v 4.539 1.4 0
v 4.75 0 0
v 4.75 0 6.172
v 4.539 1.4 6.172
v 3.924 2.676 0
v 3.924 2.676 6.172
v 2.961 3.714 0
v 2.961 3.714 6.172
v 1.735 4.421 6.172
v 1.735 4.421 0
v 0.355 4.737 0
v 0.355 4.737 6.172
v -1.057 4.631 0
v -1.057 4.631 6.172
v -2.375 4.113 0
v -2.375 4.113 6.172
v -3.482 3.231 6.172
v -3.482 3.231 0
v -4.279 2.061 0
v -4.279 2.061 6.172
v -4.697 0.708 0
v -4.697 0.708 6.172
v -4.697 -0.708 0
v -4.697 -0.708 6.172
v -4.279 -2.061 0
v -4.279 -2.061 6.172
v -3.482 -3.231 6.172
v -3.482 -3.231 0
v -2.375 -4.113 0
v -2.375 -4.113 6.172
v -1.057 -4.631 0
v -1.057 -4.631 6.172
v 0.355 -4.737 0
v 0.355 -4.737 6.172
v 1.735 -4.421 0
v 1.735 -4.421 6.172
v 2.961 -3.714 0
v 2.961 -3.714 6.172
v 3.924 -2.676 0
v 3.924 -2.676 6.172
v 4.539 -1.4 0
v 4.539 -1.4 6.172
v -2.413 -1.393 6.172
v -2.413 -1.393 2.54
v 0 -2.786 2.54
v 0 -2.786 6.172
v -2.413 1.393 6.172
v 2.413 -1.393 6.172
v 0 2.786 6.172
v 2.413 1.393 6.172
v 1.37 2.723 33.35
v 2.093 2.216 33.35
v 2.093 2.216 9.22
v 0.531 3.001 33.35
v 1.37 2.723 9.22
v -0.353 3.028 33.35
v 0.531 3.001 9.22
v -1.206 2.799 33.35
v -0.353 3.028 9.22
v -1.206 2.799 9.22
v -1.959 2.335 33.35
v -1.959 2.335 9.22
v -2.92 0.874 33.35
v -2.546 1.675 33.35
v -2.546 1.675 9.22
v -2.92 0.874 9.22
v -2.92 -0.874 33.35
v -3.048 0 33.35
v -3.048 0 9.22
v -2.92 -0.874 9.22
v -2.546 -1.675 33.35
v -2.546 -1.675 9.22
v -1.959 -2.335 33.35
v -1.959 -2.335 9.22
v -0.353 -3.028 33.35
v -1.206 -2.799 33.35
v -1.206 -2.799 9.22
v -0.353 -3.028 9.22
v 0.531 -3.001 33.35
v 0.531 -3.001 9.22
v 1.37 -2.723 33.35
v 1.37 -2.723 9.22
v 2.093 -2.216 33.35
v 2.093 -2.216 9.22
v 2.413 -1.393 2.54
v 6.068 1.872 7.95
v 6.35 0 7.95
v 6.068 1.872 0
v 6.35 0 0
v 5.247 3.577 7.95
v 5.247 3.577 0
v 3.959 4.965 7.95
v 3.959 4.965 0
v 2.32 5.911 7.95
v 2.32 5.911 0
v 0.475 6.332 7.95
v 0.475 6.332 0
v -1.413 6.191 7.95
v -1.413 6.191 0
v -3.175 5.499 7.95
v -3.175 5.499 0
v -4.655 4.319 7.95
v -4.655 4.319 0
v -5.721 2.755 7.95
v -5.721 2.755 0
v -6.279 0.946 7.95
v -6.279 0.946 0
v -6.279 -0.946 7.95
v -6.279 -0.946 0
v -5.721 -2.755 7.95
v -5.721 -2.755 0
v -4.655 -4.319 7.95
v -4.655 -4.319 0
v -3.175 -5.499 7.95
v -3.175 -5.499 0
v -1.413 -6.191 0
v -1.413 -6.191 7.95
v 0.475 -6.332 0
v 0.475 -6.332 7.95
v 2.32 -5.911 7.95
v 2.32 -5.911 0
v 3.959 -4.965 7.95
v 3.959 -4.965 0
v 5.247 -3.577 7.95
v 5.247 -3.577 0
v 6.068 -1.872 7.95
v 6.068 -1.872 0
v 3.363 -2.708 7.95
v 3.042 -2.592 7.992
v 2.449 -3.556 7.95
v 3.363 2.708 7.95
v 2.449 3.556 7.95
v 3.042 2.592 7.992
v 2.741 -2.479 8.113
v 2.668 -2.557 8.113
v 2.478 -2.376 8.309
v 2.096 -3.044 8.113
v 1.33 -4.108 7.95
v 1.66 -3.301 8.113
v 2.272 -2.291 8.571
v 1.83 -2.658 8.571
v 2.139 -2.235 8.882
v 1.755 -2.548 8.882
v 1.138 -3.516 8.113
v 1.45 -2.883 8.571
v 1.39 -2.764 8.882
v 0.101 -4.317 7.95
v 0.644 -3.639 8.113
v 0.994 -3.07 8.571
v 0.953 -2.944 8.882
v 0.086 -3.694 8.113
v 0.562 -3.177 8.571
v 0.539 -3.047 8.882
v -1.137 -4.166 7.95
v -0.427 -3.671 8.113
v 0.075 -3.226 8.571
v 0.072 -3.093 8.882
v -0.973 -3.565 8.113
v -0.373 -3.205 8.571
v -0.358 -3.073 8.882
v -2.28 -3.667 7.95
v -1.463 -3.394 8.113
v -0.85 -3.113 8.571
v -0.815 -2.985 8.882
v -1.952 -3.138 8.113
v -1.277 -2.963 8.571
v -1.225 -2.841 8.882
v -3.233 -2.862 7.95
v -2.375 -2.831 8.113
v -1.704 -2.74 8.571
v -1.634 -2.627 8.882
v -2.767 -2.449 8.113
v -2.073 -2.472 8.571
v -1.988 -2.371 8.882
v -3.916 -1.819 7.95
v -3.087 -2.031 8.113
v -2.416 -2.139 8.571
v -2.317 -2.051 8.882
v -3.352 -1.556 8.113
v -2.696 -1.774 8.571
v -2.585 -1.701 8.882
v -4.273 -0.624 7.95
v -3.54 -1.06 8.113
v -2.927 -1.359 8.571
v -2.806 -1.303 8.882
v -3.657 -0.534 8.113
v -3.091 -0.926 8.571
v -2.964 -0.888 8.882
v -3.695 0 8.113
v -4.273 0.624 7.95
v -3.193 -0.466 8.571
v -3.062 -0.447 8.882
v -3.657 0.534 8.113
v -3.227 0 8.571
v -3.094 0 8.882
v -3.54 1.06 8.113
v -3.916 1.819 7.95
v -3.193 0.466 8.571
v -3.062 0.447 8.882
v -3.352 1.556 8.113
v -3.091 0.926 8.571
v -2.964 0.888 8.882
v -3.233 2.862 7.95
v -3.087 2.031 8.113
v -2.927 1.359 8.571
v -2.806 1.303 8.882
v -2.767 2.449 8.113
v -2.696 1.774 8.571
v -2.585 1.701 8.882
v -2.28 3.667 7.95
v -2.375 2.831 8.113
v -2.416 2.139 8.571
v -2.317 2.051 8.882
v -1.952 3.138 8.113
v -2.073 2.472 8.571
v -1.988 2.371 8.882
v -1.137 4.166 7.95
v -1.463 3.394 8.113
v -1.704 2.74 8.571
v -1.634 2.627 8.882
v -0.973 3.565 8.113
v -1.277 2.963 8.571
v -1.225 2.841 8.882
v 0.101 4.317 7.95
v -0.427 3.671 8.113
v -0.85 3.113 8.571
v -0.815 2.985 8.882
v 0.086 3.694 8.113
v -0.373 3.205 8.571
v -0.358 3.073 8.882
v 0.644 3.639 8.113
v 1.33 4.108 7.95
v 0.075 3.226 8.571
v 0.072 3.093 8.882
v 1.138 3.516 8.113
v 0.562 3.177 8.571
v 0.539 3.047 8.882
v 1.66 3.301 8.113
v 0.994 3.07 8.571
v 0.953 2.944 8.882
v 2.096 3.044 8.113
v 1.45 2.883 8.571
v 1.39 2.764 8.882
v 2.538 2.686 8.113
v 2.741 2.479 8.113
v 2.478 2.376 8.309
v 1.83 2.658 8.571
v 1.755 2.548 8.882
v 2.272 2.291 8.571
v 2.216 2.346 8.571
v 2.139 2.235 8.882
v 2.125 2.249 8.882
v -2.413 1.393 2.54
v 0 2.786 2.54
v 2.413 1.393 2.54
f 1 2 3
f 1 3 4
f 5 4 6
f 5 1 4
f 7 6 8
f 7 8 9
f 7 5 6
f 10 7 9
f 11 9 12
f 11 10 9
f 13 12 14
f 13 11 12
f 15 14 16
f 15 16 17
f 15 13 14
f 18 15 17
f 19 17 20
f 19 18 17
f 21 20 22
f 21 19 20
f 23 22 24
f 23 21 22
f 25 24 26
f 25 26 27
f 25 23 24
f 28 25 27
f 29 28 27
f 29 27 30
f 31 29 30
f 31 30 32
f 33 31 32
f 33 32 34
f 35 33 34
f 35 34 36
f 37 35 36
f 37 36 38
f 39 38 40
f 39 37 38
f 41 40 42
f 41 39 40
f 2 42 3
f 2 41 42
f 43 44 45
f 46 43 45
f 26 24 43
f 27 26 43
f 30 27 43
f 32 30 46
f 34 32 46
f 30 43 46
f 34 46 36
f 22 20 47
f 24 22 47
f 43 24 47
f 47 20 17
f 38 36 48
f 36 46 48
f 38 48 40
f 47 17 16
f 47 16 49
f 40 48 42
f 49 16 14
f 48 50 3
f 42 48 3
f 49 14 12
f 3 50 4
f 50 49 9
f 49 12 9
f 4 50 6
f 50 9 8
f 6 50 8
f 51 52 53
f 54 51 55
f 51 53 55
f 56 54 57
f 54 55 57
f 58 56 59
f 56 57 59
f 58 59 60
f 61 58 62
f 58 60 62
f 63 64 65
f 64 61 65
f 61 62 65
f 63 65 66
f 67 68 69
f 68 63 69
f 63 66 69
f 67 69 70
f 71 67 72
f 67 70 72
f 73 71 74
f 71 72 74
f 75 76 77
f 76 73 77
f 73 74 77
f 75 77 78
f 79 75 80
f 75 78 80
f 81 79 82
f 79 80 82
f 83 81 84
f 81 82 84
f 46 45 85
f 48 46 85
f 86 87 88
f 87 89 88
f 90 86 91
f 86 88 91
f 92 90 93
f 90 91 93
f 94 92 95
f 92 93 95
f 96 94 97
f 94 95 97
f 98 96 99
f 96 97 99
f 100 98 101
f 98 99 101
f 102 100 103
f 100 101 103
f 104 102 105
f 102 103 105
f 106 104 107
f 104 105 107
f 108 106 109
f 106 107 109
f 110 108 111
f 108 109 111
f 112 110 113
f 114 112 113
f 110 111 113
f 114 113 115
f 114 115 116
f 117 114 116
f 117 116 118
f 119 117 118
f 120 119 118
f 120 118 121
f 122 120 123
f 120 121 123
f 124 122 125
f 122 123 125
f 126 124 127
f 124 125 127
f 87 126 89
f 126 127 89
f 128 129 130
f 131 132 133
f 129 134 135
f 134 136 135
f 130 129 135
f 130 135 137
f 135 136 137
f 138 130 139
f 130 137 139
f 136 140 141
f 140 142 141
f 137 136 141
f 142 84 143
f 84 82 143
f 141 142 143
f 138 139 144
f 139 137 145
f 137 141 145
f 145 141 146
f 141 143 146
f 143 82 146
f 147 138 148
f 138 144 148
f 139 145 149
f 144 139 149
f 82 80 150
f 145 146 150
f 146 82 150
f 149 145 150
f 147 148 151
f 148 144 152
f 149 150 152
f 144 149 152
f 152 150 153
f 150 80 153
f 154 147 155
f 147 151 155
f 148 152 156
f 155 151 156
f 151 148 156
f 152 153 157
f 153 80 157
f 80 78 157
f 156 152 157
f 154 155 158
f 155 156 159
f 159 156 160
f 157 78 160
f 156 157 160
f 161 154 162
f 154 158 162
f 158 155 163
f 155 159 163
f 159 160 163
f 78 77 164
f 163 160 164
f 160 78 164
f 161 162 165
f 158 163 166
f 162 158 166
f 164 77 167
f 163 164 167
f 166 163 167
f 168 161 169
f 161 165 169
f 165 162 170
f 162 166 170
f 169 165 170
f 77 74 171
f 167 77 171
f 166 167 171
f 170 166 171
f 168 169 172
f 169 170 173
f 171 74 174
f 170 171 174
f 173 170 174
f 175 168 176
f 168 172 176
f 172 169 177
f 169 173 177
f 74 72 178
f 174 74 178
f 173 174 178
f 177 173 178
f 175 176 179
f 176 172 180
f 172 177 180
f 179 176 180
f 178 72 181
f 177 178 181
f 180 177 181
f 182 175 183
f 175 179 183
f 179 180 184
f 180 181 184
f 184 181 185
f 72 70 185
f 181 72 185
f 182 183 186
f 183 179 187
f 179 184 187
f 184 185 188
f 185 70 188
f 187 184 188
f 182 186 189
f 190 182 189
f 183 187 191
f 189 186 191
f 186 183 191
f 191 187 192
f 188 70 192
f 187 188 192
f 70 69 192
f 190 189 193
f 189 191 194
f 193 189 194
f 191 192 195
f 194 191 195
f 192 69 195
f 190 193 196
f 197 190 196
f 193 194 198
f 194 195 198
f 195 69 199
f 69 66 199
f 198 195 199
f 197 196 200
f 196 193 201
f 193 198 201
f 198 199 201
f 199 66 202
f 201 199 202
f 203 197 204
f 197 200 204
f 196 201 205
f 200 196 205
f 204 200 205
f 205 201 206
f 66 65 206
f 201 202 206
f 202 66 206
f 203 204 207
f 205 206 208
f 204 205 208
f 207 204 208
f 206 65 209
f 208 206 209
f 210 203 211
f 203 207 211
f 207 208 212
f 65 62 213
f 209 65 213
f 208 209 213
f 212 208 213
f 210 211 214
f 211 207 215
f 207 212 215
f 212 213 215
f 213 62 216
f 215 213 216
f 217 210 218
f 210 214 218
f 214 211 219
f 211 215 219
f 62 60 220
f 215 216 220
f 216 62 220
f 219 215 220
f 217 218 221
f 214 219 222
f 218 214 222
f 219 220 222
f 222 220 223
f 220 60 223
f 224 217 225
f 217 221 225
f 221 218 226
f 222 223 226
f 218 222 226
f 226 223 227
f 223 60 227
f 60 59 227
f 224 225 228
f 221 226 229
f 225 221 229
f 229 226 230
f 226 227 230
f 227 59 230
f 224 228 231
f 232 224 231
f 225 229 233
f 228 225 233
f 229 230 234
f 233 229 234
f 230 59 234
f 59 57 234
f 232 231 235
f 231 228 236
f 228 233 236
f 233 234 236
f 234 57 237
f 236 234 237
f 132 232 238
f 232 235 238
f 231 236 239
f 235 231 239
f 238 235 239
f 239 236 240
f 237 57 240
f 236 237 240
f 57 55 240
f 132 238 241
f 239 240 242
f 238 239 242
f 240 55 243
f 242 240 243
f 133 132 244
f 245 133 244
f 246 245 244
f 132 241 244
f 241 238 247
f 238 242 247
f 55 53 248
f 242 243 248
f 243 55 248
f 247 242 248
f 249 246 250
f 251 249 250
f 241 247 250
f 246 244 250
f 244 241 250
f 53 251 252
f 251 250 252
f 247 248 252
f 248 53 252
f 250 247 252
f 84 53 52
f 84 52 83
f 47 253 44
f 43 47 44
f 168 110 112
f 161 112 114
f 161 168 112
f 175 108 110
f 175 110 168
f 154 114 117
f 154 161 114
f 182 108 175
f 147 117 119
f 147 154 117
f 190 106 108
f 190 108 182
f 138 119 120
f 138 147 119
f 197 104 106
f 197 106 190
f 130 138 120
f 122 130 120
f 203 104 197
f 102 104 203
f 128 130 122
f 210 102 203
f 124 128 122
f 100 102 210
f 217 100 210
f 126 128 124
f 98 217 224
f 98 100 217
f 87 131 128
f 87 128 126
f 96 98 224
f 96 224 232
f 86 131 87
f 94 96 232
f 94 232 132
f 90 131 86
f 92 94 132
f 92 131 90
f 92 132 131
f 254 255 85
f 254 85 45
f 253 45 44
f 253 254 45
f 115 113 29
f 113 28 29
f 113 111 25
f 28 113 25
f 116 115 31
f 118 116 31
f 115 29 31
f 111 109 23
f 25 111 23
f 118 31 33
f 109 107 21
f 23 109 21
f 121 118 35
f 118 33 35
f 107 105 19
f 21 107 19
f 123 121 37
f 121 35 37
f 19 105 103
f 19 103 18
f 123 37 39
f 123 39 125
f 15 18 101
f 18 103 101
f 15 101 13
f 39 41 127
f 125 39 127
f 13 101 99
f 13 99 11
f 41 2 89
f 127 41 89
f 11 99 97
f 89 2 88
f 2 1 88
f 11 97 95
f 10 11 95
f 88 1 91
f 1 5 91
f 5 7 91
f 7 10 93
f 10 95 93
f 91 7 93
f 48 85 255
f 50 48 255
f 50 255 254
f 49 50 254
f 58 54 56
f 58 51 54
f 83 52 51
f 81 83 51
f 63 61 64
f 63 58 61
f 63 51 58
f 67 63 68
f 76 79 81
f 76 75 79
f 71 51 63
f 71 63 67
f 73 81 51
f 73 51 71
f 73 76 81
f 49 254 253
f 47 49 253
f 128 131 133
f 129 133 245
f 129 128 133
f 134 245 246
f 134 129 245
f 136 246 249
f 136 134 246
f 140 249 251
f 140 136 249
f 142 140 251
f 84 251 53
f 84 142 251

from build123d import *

# Parameters (mm, degrees)
BOSS_EXTRUDE1_DEPTH   = 6.1722
SKETCH1_R             = 6.35
SKETCH1_R_2           = 4.7498
BOSS_EXTRUDE1_2_DEPTH = 6.1722
SKETCH2_R             = 6.35
BOSS_EXTRUDE2_DEPTH   = 1.778
SKETCH3_R             = 3.048
BOSS_EXTRUDE3_DEPTH   = 25.4
CUT_EXTRUDE1_START    = -25.4
CUT_EXTRUDE1_DEPTH    = 25.4
FILLET1_R             = 1.27
CUT_EXTRUDE2_DEPTH    = 2.54


with BuildPart() as part:
    # Sketch1 → Boss-Extrude1 (new body)
    with BuildSketch(Plane.XY):
        Polygon((-2.413, 1.3931462), (-2.413, -1.3931462), (0, -2.786292399), (2.413, -1.3931462), (2.413, 1.3931462), (0, 2.786292399), align=None)
    extrude(amount=BOSS_EXTRUDE1_DEPTH)



with BuildPart() as body_2:
    # Sketch1 → Boss-Extrude1 2 (new body)
    with BuildSketch(Plane.XY):
        Circle(SKETCH1_R)
        Circle(SKETCH1_R_2, mode=Mode.SUBTRACT)
    extrude(amount=BOSS_EXTRUDE1_2_DEPTH)


with BuildPart() as part_1:
    add(part.part)

    add(body_2.part)  # Boss-Extrude2 merges body 2
    # Sketch2 → Boss-Extrude2 (add)
    with BuildSketch(Plane.XY.offset(6.1722)):
        Circle(SKETCH2_R)
    extrude(amount=BOSS_EXTRUDE2_DEPTH)

    # Sketch3 → Boss-Extrude3 (add)
    with BuildSketch(Plane.XY.offset(7.9502)):
        with Locations(Location((0, 0, 0), (0, 0, 180))):
            Circle(SKETCH3_R)
    extrude(amount=BOSS_EXTRUDE3_DEPTH)

    # Sketch4 → Cut-Extrude1 (cut)
    with BuildSketch(Plane.XY.offset(33.3502).offset(CUT_EXTRUDE1_START)):
        with BuildLine():
            Line((2.093142983, 2.215639062), (2.093142983, -2.215639062))
            ThreePointArc((2.093142983, -2.215639062), (3.048, 0), (2.093142983, 2.215639062))
        make_face()
    extrude(amount=CUT_EXTRUDE1_DEPTH, mode=Mode.SUBTRACT)

    # Fillet1
    fillet1_edges = [part_1.edges().sort_by_distance(p)[0] for p in [
        (-3.048, 0, 7.9502),
        (2.093142983, 0, 7.9502),
    ]]
    fillet(fillet1_edges, radius=FILLET1_R)

    # Sketch5 → Cut-Extrude2 (cut)
    with BuildSketch(Plane(origin=(0, 0, 0), x_dir=(-1, 0, 0), z_dir=(0, 0, -1))):
        Polygon((2.413, -1.3931462), (2.413, 1.3931462), (0, 2.786292399), (-2.413, 1.3931462), (-2.413, -1.3931462), (0, -2.786292399), align=None)
    extrude(amount=-CUT_EXTRUDE2_DEPTH, mode=Mode.SUBTRACT)


solid = part_1.part
